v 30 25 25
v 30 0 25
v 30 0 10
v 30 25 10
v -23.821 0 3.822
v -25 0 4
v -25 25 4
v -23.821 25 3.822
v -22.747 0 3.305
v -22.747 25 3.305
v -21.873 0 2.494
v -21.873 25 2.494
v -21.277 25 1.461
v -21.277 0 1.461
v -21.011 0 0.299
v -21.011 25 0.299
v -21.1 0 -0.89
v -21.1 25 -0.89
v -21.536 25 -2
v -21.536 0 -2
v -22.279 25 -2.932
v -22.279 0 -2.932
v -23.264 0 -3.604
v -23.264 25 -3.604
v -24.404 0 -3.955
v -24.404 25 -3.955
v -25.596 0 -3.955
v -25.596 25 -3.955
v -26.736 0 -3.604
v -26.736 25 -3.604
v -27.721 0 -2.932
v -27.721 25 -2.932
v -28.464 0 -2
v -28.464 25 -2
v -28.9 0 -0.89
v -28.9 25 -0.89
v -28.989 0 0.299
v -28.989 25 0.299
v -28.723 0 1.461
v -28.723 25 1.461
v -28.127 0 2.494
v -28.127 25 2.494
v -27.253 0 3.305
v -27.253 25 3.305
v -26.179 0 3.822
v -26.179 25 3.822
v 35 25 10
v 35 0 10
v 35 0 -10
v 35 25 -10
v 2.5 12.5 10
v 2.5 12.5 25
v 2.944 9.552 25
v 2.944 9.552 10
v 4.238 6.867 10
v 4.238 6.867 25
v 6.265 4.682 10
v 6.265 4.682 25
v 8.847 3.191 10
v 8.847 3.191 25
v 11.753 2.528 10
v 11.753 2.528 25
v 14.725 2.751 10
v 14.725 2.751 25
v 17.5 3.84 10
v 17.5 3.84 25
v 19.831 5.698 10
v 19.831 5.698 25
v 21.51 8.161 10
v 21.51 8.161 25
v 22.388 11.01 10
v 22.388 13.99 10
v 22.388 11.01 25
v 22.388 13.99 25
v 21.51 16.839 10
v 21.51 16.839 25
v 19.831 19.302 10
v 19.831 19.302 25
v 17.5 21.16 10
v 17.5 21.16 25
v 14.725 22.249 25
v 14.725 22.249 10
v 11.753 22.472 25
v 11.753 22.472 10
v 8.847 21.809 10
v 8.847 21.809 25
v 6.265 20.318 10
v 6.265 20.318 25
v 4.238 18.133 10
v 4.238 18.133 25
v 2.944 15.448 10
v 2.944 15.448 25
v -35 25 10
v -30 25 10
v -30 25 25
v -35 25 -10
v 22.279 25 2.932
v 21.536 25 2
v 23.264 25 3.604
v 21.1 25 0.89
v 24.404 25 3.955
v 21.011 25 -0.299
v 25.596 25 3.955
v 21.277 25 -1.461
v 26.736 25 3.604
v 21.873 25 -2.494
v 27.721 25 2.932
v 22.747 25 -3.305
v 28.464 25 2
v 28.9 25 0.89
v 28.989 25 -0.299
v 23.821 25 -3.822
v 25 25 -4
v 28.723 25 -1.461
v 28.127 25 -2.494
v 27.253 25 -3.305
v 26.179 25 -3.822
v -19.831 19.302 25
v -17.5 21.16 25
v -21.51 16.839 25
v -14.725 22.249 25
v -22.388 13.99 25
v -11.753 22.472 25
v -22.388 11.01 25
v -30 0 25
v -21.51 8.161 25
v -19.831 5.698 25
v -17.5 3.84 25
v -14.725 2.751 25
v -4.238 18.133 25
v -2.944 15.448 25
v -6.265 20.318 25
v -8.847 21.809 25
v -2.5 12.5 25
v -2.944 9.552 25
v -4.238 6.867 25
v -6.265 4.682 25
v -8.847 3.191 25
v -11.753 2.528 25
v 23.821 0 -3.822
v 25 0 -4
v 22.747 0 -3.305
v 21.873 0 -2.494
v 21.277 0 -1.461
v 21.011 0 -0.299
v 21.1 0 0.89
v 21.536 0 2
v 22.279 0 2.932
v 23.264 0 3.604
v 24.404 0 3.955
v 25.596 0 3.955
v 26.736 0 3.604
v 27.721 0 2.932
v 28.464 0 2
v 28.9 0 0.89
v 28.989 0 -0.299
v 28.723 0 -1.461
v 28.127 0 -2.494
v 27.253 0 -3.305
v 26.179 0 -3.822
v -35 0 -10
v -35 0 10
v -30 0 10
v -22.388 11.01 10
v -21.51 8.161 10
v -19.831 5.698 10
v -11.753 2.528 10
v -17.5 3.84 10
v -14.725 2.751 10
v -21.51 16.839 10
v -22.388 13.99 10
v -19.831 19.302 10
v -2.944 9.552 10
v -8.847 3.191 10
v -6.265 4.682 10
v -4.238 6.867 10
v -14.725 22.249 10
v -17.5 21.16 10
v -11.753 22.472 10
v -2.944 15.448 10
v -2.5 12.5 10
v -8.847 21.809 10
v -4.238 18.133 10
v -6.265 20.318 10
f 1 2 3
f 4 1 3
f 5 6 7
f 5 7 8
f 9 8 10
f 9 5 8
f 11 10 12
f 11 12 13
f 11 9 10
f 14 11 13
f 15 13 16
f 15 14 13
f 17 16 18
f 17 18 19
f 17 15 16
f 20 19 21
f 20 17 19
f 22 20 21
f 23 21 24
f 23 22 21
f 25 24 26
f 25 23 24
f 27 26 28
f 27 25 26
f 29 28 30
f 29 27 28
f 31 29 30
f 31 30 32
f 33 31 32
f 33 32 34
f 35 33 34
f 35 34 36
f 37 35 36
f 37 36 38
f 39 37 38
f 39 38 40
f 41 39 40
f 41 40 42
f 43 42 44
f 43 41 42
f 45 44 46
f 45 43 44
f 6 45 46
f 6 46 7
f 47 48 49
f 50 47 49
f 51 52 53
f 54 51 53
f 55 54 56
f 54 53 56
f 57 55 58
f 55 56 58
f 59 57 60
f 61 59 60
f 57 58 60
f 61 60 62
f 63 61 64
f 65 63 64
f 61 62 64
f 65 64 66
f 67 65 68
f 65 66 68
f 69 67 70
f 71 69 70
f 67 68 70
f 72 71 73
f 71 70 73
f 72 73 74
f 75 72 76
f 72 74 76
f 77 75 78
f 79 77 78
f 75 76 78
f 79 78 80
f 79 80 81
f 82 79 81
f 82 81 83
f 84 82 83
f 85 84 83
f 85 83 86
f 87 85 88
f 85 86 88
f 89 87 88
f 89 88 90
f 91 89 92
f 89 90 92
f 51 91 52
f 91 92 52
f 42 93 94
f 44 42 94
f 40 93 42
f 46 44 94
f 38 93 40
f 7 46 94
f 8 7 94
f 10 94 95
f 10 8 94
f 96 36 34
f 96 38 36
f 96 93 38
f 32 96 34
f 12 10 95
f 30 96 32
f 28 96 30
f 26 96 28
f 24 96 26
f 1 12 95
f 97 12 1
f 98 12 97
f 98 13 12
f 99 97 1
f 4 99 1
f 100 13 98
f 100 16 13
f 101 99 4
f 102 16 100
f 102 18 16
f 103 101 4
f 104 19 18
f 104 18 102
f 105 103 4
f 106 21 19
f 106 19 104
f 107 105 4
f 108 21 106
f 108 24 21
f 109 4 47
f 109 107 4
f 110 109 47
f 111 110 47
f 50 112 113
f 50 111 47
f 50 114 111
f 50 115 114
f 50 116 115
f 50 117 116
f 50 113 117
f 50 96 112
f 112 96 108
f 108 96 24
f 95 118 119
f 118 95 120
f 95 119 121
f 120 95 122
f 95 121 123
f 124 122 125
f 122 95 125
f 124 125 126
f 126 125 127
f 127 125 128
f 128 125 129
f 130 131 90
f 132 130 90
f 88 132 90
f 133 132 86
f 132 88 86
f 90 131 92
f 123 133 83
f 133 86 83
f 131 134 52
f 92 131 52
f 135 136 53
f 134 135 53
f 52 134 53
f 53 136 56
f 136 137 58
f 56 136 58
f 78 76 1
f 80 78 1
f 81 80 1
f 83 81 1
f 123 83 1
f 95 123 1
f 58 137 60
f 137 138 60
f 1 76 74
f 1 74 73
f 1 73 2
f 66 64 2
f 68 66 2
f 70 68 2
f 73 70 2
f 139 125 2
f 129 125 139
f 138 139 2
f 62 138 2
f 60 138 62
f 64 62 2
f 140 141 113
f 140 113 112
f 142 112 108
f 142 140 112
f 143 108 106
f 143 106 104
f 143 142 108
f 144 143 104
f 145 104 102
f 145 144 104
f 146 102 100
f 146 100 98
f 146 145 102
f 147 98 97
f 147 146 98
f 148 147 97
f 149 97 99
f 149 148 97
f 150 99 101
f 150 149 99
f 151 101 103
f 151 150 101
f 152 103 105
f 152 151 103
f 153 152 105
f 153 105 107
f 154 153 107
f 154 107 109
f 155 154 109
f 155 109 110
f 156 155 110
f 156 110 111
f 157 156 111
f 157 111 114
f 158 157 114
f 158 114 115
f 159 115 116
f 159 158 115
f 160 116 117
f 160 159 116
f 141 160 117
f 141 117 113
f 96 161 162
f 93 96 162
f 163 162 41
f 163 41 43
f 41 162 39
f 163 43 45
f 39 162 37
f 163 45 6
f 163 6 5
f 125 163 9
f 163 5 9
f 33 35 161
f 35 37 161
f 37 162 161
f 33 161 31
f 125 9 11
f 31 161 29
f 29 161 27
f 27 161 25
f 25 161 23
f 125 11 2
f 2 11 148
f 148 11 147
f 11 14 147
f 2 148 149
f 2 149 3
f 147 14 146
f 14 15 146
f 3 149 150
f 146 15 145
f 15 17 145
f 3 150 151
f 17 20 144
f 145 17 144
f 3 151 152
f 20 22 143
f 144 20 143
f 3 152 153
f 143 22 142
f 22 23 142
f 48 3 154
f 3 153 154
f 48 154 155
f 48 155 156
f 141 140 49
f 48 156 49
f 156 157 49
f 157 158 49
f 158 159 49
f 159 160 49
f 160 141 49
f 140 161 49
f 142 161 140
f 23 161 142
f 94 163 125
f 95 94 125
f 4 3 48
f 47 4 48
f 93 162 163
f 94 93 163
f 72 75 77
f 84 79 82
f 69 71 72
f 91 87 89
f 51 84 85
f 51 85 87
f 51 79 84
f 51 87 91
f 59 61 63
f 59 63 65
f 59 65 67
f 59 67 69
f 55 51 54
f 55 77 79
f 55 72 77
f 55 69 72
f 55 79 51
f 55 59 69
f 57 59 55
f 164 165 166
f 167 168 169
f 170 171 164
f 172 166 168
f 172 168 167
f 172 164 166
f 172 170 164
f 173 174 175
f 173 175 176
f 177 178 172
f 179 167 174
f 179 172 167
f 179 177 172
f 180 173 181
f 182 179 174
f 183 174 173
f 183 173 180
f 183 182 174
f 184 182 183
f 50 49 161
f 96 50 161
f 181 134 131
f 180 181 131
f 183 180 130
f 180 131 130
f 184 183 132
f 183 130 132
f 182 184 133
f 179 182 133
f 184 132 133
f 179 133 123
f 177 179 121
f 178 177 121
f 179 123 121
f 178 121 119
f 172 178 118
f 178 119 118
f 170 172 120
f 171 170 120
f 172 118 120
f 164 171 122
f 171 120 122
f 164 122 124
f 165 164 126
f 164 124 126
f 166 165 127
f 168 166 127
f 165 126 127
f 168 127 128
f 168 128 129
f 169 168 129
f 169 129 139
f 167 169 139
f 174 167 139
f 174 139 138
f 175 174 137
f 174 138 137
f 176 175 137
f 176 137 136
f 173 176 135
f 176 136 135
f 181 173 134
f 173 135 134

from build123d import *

# Parameters (mm, degrees)
SKETCH1_R           = 4
BOSS_EXTRUDE1_DEPTH = 25
SKETCH2_R           = 10
CUT_EXTRUDE1_DEPTH  = 15


with BuildPart() as part:
    # Sketch1 → Boss-Extrude1 (new body)
    with BuildSketch(Plane(origin=(0, 0, 0), x_dir=(1, 0, 0), z_dir=(0, 1, 0))):
        Polygon((-35, -10), (-30, -10), (-30, -25), (30, -25), (30, -10), (35, -10), (35, 10), (-35, 10), align=None)
        with Locations(Location((-25, 0, 0), (0, 0, 270))):
            Circle(SKETCH1_R, mode=Mode.SUBTRACT)
        with Locations(Location((25, 0, 0), (0, 0, 90))):
            Circle(SKETCH1_R, mode=Mode.SUBTRACT)
    extrude(amount=BOSS_EXTRUDE1_DEPTH)

    # Sketch2 → Cut-Extrude1 (cut)
    with BuildSketch(Plane.XY.offset(25)):
        with Locations((-12.5, 12.5)):
            Circle(SKETCH2_R)
        with Locations(Location((12.5, 12.5, 0), (0, 0, 180))):
            Circle(SKETCH2_R)
    extrude(amount=-CUT_EXTRUDE1_DEPTH, mode=Mode.SUBTRACT)


solid = part.part
